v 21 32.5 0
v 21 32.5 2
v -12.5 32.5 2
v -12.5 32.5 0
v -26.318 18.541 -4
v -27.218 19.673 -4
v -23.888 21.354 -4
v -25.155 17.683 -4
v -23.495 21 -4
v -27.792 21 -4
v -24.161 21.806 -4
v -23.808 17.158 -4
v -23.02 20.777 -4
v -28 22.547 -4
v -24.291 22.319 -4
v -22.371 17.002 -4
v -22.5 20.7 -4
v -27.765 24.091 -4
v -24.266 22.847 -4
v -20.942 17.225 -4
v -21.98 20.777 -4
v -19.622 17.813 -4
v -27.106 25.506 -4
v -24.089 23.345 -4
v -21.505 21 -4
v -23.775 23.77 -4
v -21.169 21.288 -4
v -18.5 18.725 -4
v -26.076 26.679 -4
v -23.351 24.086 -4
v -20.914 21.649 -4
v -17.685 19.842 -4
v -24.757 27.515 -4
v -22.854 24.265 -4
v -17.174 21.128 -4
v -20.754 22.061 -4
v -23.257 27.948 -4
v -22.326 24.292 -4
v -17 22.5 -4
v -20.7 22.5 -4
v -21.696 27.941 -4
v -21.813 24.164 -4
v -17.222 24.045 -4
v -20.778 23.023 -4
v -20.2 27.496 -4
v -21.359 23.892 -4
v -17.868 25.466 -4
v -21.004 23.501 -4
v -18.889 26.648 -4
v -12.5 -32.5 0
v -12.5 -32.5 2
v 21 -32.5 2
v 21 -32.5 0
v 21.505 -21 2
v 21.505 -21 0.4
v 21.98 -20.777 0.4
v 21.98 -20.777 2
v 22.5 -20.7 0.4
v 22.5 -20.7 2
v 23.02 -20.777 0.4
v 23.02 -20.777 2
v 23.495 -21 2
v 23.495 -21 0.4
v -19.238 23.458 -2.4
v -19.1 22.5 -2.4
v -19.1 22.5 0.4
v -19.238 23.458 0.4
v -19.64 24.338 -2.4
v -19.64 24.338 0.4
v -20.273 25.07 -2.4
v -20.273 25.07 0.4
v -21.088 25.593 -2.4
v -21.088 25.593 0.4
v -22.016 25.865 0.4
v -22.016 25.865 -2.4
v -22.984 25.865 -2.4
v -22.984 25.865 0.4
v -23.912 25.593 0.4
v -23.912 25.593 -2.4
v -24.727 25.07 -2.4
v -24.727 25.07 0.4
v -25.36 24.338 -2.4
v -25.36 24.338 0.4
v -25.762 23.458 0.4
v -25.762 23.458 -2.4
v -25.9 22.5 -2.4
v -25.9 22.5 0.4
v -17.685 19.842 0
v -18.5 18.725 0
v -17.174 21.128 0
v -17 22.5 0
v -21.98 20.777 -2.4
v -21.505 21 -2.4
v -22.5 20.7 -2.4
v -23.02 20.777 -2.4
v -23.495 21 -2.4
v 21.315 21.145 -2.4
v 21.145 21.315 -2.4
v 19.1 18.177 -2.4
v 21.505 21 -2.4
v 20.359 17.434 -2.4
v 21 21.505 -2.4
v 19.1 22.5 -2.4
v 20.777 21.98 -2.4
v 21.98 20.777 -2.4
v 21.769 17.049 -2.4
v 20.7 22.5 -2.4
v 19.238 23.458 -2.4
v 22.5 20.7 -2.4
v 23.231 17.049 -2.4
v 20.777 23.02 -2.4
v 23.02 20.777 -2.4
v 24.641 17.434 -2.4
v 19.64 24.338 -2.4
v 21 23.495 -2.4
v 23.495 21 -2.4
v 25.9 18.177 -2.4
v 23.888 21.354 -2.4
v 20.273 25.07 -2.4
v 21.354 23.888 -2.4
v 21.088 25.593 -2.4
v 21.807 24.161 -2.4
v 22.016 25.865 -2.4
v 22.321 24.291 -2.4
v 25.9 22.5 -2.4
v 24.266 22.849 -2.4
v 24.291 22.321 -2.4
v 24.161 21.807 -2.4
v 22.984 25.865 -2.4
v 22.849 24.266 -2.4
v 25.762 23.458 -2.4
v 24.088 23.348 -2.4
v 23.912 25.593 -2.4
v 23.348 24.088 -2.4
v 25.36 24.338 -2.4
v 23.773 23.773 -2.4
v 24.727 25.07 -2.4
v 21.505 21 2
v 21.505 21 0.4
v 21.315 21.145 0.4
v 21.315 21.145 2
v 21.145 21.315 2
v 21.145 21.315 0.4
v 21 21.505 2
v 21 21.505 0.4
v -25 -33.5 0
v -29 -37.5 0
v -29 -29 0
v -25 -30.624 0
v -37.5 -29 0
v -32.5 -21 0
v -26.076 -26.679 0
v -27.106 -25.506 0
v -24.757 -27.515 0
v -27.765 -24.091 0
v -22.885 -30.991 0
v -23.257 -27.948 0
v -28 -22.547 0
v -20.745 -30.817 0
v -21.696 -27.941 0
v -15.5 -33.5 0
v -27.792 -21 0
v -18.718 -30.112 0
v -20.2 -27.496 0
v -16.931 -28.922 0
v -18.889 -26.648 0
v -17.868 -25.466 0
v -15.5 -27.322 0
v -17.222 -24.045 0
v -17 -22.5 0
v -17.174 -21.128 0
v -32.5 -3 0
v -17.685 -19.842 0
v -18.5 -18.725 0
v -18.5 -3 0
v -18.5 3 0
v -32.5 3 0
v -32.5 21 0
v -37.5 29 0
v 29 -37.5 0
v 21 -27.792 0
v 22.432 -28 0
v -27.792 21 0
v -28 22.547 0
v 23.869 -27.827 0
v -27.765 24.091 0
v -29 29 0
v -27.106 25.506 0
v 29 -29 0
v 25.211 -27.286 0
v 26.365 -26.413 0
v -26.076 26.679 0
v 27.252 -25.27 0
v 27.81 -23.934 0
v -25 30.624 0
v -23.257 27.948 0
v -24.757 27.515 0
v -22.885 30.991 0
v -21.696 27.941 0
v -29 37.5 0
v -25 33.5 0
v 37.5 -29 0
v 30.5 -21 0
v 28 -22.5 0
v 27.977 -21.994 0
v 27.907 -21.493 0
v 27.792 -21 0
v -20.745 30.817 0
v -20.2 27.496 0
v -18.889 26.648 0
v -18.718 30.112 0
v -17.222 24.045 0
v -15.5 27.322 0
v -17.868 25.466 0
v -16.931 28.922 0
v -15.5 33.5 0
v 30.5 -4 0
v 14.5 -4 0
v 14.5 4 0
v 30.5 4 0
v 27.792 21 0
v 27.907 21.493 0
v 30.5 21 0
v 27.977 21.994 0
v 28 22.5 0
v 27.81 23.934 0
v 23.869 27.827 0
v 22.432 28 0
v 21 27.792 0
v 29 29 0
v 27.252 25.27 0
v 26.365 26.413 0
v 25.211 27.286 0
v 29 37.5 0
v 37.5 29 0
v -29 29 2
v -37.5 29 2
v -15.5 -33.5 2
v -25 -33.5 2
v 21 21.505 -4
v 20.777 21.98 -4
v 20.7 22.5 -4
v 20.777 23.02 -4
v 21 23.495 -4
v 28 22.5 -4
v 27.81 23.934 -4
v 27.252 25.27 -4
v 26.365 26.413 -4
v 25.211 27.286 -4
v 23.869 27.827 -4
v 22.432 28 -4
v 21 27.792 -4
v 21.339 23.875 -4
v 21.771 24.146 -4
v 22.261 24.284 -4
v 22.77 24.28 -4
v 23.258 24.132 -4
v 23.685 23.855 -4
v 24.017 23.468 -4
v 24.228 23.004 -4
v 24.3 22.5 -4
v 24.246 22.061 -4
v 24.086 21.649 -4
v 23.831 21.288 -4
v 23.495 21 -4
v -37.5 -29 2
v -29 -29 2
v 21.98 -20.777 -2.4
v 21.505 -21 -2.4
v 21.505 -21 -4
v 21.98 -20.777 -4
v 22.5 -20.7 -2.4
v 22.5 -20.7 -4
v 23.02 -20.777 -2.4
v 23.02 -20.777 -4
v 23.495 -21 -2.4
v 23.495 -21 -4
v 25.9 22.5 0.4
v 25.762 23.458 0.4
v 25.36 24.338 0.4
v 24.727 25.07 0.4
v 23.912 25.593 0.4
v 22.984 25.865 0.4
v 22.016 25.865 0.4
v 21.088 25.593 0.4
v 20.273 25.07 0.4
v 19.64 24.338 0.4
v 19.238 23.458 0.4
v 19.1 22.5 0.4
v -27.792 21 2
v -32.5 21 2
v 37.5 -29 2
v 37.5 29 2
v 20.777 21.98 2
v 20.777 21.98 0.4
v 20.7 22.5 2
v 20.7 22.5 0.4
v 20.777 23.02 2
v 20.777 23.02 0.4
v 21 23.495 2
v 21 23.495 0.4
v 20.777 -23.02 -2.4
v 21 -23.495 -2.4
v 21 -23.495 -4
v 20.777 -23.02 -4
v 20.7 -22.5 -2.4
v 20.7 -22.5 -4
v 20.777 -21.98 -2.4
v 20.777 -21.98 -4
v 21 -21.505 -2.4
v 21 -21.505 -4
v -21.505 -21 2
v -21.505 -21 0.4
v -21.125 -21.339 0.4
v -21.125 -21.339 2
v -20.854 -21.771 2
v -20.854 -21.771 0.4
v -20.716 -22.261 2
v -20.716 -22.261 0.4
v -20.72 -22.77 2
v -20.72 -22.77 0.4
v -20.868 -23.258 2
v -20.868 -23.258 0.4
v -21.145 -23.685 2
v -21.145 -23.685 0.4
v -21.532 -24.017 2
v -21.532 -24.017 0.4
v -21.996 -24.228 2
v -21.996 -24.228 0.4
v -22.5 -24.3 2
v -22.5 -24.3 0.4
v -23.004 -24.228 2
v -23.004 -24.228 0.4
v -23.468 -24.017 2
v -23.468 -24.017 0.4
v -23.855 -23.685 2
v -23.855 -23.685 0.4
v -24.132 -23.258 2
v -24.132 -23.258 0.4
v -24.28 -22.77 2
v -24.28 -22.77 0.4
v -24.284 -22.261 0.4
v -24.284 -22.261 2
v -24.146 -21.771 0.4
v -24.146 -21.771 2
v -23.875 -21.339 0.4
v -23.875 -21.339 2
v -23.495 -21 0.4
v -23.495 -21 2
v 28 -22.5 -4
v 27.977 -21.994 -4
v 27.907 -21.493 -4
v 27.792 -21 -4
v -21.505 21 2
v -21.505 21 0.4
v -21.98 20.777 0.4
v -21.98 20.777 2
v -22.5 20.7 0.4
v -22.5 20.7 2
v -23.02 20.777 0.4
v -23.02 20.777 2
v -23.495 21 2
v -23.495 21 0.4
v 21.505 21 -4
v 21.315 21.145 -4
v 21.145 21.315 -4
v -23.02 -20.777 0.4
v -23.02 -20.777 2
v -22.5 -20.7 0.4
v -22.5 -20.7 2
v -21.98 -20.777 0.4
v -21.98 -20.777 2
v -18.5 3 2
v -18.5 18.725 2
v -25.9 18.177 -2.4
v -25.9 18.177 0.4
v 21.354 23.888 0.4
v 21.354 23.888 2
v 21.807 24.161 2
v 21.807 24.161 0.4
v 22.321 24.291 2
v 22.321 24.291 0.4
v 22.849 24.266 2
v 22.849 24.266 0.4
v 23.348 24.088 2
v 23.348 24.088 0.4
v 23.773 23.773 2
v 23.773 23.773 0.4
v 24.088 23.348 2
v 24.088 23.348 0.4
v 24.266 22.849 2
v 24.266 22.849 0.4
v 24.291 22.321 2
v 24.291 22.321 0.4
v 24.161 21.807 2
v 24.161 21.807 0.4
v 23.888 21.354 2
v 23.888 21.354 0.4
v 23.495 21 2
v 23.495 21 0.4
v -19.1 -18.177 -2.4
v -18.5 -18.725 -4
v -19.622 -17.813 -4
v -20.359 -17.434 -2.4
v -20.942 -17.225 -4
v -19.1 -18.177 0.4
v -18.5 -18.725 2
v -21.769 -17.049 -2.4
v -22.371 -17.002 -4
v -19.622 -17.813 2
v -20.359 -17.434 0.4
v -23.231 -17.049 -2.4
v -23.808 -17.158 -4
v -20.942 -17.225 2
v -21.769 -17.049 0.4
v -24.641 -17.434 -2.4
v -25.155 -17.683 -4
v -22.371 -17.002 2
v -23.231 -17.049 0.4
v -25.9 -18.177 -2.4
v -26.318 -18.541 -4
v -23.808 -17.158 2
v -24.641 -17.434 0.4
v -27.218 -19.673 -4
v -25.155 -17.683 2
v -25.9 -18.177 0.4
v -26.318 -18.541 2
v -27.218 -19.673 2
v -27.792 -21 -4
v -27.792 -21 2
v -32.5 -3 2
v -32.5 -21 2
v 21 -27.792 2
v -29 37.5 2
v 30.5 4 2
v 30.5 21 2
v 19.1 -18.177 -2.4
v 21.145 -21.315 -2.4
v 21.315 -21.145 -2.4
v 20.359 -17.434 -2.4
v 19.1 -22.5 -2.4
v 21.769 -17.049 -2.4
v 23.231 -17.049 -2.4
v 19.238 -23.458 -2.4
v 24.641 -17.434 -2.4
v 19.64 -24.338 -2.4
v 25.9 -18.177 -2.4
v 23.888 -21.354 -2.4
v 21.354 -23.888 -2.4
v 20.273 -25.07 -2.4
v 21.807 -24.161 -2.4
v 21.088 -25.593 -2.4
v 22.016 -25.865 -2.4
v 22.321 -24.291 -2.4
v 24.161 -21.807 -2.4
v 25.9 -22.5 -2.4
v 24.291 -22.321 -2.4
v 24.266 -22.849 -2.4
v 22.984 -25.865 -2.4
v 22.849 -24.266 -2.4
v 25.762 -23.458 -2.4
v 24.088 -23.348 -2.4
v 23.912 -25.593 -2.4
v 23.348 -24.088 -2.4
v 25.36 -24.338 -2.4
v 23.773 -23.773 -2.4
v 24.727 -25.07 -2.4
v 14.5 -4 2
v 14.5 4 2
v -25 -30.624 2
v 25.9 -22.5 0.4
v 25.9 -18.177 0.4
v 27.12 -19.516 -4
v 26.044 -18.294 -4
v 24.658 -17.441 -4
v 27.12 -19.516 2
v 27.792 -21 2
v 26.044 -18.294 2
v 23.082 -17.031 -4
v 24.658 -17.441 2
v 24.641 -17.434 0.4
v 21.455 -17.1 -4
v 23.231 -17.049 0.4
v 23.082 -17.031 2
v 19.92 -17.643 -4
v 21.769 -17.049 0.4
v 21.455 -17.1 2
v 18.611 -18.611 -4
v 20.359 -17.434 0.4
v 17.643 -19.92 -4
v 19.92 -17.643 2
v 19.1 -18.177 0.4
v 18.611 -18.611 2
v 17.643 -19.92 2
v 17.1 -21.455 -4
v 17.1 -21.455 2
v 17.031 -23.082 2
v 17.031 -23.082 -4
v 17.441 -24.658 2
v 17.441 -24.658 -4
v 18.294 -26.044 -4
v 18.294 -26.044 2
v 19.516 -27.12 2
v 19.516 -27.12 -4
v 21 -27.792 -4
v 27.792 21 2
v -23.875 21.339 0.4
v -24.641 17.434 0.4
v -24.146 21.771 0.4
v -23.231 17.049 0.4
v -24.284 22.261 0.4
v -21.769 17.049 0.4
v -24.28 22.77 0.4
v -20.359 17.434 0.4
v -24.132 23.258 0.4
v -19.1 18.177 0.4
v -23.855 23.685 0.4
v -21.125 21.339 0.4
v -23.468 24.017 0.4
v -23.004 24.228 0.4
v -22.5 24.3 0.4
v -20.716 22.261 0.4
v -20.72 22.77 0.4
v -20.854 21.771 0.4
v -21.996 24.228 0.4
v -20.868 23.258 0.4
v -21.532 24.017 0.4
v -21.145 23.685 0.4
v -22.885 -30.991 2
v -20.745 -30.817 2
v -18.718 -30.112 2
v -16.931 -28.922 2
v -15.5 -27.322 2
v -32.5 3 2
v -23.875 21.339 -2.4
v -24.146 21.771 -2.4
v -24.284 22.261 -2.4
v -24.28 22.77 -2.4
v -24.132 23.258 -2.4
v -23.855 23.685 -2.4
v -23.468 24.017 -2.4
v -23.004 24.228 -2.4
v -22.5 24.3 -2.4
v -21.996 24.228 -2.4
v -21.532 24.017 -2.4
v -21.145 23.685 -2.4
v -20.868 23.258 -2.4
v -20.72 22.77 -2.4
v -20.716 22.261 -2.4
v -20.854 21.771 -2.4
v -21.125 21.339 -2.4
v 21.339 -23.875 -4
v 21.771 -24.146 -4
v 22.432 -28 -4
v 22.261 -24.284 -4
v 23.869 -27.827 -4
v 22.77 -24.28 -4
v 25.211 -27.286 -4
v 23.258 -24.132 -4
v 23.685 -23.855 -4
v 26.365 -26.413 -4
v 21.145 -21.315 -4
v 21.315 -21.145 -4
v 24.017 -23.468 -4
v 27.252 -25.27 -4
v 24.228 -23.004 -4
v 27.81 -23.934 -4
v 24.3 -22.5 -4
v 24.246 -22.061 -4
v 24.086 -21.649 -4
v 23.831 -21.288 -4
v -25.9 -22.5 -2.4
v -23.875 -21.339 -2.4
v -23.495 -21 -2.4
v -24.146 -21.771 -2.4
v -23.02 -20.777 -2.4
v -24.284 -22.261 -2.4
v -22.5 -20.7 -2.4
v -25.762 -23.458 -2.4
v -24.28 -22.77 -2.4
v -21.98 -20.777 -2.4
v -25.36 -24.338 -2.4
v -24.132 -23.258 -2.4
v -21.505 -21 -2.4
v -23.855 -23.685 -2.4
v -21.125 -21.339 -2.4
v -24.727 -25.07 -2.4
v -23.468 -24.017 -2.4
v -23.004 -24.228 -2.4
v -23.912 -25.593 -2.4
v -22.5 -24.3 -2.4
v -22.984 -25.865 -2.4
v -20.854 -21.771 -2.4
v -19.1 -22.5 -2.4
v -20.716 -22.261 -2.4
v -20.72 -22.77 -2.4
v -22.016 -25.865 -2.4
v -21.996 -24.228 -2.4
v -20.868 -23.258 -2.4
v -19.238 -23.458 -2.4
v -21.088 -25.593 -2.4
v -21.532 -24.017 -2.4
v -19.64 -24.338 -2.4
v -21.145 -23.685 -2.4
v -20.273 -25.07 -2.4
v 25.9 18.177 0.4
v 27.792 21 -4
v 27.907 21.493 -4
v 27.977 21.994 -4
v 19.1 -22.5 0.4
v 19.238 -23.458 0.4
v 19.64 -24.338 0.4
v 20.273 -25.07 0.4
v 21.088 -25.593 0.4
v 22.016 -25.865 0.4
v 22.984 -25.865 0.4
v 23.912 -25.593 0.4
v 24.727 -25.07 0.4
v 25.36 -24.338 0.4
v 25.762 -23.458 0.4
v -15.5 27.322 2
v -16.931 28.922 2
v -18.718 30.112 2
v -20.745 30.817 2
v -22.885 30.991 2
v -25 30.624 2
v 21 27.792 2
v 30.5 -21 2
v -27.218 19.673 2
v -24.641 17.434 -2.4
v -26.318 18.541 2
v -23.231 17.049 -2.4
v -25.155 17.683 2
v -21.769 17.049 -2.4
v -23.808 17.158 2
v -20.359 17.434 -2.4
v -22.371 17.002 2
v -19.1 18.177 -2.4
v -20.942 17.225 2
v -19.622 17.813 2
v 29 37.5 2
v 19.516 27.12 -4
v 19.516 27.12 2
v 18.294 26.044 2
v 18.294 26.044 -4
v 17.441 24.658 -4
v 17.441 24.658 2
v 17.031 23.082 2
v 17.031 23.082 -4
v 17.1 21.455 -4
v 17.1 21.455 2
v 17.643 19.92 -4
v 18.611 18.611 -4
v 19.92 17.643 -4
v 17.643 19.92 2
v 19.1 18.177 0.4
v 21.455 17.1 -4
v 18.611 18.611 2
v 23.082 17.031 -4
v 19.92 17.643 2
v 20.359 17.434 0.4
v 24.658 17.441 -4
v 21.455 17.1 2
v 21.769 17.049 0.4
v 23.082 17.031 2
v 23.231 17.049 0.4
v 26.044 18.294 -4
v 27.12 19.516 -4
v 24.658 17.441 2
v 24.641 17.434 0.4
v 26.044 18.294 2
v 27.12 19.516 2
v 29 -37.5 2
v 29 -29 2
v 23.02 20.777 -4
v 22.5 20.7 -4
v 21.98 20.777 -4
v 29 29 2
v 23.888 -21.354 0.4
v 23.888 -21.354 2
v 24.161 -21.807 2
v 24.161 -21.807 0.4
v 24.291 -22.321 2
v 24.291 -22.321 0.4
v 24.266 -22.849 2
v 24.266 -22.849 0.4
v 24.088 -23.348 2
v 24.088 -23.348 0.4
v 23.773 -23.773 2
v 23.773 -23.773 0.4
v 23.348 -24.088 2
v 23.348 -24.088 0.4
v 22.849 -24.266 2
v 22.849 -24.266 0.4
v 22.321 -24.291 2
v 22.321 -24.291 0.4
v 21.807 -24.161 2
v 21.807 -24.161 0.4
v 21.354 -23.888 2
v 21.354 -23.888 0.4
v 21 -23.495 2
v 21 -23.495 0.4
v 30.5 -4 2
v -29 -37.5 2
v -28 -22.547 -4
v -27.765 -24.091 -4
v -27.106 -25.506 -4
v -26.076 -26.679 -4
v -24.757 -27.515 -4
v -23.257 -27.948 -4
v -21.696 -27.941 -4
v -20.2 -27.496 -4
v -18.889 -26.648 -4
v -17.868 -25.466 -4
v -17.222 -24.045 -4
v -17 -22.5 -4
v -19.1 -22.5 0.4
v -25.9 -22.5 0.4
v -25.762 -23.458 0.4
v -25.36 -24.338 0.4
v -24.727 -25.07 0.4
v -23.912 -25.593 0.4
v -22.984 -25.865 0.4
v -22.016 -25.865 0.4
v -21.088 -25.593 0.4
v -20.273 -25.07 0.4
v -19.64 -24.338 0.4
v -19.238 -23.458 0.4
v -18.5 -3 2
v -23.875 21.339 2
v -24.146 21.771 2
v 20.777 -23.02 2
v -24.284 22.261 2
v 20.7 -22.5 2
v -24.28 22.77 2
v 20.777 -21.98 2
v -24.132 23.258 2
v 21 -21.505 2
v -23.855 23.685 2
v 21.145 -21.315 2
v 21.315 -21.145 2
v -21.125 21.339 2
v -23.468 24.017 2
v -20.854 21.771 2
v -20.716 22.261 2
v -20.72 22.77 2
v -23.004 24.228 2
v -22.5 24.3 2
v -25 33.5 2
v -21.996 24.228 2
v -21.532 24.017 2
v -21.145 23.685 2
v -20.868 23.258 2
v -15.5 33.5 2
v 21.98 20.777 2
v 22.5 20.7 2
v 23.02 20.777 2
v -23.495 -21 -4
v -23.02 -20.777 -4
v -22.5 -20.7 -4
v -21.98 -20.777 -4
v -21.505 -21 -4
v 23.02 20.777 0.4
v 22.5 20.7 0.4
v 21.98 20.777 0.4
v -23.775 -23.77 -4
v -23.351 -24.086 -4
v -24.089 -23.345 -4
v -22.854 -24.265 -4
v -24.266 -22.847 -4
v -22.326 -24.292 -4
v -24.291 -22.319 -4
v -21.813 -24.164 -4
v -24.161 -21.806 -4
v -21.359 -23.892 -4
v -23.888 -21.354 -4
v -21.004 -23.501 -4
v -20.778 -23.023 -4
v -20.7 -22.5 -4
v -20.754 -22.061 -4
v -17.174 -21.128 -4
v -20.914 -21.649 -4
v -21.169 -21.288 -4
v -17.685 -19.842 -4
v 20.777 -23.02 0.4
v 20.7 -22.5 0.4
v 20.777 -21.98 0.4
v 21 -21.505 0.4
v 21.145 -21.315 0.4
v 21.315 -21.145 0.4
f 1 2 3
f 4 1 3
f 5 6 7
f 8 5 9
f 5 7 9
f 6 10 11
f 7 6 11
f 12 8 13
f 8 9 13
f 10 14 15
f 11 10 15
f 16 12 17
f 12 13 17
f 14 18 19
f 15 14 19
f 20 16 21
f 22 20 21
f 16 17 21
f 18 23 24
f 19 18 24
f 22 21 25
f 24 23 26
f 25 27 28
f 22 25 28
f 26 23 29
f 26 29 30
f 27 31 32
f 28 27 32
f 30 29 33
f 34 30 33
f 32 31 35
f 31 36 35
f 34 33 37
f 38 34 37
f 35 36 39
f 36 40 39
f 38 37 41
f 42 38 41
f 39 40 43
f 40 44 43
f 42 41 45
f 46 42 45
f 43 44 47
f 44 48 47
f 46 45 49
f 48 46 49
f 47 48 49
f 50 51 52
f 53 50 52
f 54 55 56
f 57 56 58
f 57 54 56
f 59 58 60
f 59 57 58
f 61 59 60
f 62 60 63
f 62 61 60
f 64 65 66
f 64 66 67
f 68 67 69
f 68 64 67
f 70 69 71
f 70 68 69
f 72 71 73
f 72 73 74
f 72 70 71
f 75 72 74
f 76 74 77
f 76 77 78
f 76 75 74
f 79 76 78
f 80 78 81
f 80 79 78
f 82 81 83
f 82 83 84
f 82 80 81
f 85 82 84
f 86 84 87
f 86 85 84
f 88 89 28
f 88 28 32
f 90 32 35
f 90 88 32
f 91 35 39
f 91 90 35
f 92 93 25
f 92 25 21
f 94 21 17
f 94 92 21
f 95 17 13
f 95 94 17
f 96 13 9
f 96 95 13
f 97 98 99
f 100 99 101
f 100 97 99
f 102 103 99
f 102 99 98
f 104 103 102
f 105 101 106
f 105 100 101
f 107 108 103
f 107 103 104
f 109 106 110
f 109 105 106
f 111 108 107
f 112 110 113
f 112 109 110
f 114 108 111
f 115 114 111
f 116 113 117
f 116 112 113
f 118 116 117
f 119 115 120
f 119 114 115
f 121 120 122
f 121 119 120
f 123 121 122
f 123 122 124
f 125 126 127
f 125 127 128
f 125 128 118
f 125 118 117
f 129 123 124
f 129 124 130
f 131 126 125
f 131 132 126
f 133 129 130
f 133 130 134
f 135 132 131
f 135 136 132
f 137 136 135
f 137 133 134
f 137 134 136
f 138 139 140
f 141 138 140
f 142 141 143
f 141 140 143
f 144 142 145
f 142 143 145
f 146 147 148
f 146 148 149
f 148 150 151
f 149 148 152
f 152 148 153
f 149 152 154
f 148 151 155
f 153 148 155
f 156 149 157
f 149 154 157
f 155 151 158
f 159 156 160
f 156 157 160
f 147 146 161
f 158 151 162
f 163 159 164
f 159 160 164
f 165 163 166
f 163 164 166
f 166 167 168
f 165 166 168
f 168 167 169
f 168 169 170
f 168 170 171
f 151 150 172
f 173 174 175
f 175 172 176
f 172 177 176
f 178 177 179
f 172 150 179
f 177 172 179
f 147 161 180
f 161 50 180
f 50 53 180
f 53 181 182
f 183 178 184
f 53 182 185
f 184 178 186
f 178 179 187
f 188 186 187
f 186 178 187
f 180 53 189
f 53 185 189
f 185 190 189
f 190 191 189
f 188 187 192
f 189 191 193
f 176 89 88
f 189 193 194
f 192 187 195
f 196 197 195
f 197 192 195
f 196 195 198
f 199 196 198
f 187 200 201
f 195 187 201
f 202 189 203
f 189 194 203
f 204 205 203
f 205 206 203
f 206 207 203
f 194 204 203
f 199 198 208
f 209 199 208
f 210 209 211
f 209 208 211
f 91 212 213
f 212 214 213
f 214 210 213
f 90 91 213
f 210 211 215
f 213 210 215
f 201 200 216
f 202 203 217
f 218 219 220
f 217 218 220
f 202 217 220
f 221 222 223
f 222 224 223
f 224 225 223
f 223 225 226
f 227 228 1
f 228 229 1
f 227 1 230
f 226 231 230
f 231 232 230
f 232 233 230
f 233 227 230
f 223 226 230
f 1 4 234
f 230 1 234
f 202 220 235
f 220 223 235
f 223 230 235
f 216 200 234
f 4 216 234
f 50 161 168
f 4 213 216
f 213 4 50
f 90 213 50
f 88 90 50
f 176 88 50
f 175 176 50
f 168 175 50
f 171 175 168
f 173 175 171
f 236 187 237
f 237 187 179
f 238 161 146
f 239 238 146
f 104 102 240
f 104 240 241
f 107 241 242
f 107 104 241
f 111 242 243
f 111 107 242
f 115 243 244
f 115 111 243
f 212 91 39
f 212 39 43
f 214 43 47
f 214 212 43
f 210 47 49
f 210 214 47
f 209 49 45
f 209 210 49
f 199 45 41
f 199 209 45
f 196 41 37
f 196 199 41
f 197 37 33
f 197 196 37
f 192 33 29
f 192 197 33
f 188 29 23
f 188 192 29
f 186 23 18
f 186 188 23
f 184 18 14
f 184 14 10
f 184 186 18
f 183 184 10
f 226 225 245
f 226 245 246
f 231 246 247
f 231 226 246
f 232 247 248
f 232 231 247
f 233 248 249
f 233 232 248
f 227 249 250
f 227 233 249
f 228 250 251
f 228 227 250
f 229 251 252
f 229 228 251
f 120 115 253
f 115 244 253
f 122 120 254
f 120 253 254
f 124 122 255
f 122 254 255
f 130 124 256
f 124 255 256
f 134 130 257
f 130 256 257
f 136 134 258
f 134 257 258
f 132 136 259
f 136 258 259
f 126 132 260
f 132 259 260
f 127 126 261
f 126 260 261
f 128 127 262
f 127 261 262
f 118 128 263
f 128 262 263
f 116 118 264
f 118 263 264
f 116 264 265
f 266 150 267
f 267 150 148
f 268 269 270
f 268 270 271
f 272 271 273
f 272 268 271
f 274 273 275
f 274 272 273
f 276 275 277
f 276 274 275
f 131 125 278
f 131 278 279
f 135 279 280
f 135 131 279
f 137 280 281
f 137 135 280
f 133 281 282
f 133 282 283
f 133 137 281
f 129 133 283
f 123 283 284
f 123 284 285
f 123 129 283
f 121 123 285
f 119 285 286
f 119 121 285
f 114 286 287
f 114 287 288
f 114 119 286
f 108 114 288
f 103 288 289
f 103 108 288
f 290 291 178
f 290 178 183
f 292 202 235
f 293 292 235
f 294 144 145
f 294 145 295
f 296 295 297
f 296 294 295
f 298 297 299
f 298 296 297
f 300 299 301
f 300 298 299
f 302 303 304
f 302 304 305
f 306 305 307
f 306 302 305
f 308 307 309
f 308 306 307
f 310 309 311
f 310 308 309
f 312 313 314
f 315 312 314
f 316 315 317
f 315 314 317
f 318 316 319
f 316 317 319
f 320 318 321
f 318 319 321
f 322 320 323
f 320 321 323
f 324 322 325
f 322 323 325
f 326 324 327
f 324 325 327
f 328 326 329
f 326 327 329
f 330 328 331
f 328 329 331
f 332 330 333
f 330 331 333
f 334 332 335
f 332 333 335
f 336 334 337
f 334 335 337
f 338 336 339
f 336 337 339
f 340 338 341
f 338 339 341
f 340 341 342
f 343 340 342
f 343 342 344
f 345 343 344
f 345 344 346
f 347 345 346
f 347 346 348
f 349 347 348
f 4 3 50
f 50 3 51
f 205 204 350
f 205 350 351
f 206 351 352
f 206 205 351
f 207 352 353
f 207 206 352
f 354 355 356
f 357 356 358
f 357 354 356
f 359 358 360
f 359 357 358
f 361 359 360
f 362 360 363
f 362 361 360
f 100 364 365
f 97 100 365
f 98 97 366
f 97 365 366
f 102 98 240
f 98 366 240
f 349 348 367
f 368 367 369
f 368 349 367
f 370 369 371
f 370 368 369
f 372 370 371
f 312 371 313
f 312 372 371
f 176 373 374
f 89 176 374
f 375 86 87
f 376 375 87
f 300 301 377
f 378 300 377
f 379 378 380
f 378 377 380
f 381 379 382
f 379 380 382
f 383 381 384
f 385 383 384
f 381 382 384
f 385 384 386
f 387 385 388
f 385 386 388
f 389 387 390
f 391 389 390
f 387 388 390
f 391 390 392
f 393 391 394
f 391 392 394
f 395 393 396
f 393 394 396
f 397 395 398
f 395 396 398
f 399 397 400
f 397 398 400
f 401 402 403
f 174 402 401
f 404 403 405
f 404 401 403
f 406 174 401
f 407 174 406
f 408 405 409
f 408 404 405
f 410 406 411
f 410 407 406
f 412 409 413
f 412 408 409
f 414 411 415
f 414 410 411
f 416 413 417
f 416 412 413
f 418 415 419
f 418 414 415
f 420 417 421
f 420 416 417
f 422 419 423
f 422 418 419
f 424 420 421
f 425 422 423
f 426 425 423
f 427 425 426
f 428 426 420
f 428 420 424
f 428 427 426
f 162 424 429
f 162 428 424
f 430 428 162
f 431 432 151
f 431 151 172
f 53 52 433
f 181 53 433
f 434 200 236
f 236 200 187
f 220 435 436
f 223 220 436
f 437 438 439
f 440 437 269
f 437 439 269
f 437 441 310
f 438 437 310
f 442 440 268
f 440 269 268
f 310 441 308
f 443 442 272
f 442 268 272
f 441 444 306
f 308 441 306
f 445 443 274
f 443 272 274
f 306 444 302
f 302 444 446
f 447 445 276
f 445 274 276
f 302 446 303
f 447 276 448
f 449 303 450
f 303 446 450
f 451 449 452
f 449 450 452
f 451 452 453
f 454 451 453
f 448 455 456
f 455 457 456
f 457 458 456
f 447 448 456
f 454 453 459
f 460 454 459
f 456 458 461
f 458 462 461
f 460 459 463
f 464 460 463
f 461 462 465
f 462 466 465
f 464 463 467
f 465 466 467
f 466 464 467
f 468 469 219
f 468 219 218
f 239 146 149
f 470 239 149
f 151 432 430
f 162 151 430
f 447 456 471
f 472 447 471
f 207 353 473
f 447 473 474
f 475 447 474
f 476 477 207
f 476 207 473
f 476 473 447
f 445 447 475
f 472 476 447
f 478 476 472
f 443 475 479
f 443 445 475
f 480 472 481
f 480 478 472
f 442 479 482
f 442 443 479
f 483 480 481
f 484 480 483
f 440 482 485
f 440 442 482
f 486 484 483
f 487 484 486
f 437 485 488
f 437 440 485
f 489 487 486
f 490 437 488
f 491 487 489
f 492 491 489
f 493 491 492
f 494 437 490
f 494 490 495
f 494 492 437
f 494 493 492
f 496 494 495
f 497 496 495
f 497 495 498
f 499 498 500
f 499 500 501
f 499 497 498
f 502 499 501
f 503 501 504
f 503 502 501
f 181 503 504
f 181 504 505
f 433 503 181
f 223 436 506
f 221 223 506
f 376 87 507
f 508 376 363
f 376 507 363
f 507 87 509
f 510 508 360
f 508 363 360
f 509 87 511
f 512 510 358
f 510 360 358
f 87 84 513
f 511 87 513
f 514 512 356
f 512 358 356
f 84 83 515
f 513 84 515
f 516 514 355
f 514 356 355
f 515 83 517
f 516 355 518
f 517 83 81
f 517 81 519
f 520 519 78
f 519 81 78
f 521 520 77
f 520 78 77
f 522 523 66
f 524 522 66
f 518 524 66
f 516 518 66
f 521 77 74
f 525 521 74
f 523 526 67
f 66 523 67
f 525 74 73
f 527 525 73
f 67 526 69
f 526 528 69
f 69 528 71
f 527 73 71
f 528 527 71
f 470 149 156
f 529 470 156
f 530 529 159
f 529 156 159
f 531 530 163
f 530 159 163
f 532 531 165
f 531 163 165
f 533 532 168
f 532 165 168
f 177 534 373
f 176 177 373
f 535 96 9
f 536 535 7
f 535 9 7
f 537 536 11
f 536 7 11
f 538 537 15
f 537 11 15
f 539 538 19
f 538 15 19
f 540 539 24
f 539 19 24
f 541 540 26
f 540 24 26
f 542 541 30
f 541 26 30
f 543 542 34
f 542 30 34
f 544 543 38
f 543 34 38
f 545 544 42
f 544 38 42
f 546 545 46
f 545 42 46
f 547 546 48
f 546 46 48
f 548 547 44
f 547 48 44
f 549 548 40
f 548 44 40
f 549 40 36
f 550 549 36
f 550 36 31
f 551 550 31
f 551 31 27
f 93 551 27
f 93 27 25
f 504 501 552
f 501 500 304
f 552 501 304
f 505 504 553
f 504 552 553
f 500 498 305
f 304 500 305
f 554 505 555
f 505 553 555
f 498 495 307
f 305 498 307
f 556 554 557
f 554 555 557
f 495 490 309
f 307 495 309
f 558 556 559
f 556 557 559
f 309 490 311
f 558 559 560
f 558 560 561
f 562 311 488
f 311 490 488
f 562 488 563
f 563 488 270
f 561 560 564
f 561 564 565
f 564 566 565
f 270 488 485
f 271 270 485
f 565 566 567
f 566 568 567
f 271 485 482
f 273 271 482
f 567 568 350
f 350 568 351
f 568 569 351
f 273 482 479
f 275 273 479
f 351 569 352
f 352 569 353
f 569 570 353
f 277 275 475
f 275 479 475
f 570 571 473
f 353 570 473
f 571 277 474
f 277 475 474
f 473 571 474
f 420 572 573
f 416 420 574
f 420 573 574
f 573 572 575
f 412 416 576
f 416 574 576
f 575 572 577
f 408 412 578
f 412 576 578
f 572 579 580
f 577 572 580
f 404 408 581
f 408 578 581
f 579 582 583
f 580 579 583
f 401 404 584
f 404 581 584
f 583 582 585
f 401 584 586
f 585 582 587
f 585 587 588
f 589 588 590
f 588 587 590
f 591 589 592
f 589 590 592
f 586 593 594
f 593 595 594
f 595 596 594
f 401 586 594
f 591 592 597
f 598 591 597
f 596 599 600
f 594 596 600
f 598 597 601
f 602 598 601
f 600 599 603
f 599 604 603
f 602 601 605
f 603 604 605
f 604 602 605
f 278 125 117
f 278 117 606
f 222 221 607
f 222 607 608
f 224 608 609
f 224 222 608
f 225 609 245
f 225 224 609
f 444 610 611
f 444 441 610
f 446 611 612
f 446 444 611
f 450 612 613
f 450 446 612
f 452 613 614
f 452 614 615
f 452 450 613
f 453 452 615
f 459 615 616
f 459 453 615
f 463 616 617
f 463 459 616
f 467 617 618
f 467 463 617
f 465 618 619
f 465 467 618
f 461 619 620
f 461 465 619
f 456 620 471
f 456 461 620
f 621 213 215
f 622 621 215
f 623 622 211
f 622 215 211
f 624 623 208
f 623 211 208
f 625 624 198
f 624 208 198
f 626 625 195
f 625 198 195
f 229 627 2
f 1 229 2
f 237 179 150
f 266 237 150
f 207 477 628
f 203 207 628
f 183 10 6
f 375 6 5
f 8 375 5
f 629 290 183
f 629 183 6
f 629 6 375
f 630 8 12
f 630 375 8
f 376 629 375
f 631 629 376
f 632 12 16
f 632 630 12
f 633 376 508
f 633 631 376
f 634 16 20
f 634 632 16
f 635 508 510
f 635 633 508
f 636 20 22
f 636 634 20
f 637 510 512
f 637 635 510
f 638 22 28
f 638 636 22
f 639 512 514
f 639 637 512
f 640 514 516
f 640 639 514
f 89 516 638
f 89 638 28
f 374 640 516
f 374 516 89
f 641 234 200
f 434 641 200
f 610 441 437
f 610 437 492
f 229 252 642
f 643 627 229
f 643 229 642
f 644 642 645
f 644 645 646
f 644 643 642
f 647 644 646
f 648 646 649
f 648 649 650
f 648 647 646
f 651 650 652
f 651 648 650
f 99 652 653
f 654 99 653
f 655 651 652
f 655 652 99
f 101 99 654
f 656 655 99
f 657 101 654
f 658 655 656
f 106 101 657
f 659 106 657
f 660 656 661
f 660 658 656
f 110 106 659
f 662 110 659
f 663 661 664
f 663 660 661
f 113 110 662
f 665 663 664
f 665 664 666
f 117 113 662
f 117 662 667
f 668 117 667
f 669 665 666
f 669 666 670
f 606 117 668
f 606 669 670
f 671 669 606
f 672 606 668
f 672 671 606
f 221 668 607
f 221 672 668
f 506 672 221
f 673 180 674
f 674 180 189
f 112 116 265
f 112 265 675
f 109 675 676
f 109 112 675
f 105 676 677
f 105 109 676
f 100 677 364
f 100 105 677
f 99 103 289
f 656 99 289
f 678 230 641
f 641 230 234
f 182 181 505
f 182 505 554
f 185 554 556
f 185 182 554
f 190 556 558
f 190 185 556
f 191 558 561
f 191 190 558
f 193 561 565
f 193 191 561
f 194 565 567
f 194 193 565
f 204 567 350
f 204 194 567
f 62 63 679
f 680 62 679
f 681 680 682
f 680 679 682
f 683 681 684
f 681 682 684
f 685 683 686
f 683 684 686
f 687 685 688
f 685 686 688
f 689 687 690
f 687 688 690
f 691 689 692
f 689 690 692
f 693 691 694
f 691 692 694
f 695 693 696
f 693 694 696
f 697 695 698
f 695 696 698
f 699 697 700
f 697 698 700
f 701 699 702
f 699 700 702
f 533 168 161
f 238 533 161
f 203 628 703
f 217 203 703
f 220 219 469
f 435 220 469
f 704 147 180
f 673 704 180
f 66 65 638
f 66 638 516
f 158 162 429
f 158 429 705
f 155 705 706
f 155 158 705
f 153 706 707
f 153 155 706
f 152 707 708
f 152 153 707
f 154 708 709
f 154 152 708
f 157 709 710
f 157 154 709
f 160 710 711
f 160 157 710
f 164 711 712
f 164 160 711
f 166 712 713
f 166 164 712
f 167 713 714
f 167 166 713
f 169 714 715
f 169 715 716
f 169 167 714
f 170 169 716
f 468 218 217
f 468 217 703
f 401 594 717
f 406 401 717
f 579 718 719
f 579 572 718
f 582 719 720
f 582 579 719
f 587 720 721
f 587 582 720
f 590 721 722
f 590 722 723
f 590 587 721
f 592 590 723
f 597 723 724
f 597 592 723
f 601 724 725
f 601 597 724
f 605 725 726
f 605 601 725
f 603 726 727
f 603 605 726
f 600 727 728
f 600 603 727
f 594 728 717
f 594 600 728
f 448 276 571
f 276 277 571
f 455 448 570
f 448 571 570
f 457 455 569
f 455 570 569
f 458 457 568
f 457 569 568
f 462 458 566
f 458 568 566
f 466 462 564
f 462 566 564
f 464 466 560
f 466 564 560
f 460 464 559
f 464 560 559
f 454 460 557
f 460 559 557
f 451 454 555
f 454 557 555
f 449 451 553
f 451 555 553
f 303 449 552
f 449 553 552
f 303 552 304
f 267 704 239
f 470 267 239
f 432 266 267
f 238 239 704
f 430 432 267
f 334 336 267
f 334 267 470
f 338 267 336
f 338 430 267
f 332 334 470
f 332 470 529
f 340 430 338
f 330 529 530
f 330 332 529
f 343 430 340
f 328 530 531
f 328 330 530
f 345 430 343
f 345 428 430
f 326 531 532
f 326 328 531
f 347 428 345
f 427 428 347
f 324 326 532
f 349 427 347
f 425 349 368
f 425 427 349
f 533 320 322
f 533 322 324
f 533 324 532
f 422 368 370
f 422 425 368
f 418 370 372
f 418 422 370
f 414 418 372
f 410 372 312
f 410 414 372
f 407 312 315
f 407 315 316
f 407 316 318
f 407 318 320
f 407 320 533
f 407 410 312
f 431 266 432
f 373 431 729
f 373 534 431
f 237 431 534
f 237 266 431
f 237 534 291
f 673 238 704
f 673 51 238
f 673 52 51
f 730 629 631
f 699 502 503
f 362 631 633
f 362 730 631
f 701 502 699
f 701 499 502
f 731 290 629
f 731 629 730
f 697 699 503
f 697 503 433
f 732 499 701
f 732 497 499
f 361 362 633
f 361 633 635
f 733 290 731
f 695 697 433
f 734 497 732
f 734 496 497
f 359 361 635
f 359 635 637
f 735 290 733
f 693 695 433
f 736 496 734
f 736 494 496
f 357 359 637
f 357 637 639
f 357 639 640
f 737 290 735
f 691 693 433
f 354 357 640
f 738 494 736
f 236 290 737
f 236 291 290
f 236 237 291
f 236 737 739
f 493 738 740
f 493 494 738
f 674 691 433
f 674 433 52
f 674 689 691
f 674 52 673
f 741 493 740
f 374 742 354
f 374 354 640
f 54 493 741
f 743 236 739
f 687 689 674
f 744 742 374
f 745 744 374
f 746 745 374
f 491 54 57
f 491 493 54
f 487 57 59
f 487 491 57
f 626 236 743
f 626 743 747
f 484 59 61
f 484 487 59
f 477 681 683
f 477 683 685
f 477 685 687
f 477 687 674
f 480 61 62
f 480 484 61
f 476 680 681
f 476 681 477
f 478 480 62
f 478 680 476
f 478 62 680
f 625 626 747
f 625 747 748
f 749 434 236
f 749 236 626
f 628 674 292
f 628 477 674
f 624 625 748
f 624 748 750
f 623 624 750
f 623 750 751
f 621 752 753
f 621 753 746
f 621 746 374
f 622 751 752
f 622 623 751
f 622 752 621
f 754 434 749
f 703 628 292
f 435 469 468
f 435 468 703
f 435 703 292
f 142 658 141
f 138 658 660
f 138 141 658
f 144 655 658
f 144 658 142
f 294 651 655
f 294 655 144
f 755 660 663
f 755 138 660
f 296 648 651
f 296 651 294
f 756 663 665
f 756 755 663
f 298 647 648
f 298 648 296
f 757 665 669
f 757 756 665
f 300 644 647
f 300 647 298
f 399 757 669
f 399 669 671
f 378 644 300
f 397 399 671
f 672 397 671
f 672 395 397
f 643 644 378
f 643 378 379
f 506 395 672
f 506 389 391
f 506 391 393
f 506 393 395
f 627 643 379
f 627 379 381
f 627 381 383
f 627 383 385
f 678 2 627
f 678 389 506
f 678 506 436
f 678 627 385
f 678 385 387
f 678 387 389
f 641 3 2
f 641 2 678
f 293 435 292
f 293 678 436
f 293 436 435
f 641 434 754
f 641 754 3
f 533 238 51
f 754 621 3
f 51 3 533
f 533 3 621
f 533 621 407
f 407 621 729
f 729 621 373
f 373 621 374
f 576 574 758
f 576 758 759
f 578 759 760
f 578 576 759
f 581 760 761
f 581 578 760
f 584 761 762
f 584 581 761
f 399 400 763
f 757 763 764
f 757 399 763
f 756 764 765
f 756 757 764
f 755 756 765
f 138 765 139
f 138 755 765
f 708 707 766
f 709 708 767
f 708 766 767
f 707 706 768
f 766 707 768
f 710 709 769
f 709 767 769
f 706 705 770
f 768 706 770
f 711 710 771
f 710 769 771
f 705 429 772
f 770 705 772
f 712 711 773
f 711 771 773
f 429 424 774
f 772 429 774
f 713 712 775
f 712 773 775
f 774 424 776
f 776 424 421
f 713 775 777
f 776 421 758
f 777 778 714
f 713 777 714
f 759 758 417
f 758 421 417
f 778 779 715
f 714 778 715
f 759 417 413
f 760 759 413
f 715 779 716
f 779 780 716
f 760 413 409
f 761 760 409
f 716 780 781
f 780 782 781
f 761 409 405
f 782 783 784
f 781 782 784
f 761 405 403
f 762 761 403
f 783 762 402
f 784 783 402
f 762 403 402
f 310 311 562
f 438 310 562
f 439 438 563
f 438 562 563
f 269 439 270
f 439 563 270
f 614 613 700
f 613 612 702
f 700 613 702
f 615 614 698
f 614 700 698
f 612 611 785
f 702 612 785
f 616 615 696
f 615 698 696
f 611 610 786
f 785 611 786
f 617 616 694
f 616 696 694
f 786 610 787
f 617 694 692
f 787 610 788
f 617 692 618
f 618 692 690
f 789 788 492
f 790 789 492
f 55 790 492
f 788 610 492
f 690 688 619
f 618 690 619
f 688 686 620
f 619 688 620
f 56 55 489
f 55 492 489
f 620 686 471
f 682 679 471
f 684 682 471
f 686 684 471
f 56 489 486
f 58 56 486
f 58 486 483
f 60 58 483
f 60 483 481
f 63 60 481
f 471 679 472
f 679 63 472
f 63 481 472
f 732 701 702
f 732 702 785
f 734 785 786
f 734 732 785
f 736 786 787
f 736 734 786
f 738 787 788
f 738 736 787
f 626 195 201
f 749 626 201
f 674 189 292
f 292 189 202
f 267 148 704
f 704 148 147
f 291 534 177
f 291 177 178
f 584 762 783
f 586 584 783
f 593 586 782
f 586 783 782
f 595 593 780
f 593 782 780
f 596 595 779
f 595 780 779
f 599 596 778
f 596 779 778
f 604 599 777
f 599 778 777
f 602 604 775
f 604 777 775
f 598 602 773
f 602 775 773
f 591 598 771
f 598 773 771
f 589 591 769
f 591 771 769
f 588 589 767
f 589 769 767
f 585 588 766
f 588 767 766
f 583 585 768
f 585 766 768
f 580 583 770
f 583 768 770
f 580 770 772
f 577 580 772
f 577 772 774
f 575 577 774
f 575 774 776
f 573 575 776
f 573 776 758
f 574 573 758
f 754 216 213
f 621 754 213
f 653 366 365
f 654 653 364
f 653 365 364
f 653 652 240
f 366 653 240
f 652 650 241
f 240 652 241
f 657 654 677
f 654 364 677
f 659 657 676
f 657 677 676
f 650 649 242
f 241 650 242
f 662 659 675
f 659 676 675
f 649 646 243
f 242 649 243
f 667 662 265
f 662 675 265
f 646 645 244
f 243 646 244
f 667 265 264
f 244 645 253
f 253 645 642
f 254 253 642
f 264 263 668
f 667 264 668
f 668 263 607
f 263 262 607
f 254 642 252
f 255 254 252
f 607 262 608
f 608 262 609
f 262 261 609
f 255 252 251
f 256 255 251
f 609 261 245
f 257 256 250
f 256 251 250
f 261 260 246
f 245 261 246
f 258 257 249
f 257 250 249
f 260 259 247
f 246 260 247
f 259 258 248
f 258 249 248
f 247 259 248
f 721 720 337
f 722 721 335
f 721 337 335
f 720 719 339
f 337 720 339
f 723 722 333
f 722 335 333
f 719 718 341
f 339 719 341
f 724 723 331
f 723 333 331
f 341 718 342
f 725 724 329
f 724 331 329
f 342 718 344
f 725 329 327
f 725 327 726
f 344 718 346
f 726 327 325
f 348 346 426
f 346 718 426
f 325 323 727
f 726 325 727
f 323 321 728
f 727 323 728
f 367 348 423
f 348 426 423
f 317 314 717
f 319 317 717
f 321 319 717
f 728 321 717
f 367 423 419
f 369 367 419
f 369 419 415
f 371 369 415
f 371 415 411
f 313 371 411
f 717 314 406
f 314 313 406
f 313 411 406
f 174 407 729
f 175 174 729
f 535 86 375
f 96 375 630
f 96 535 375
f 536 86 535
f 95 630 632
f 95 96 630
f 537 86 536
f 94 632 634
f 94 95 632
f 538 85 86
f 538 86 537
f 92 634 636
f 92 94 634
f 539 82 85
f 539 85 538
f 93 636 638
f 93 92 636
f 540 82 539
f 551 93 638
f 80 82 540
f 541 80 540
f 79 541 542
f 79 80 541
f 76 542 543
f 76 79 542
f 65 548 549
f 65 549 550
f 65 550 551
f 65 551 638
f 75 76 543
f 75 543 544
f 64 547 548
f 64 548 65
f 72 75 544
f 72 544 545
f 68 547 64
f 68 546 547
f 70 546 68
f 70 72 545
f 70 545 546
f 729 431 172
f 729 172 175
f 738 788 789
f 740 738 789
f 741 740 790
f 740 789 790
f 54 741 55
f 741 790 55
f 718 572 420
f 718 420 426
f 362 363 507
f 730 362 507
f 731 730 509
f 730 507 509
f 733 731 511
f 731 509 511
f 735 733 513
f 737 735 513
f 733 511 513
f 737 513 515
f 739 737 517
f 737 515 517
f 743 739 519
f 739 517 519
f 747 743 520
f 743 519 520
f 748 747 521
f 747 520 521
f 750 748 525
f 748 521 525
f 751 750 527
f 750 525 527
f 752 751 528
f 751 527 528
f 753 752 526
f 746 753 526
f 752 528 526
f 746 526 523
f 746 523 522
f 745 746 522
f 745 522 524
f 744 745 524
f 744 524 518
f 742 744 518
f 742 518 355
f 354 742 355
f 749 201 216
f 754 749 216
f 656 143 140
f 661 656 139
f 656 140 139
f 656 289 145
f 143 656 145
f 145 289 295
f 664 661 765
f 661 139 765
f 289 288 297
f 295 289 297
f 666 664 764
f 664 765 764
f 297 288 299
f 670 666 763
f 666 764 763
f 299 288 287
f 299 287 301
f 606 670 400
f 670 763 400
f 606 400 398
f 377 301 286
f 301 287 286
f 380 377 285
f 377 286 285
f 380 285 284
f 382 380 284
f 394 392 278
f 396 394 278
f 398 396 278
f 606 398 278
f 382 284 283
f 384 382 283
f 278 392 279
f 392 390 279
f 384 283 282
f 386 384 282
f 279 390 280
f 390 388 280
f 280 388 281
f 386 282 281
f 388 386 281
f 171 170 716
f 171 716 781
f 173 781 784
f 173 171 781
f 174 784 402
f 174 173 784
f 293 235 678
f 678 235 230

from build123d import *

# Parameters (mm, degrees)
F2_DEPTH       = 2
F3_W           = 13.9999988079
F3_H           = 18
F4_DEPTH       = 2.001
F6_DEPTH       = 6
F7_R           = 1.8
F8_DEPTH       = 6.001
F10_R          = 3.4
F11_DEPTH      = 1.4
F11_DEPTH_BACK = 1.4
F13_W          = 6.8
F13_H          = 2.8
F14_DEPTH      = 8.8
F16_W          = 6.8
F16_H          = 2.8
F17_DEPTH      = 10.3
F18_W          = 8
F18_H          = 2
F19_DEPTH      = 16
F21_DEPTH      = 2.001


# Not quite as in the source:
# - after a boolean that leaves OpenCascade's solid faulty, fix() repairs it
# - a feature names something its author has since deleted; it is built from what else it names


with BuildPart() as f2:
    # F1 (on Top) → F2 (new body)
    with BuildSketch(Plane.XY):
        Polygon((29, 29), (29, 37.5), (-29, 37.5), (-29, 29), (-37.5, 29), (-37.5, -29), (-29, -29), (-29, -37.5), (29, -37.5), (29, -29), (37.5, -29), (37.5, 29), align=None)
    extrude(amount=F2_DEPTH)

    # F3 (on face) → F4 (cut, through all)
    with BuildSketch(Plane.XY.offset(2)):
        with Locations((-25.499999404, 12)):
            Rectangle(F3_W, F3_H)
        with Locations((-25.499999404, -12)):
            Rectangle(F3_W, F3_H)
        Polygon((-12.5, -32.5), (21, -32.5), (21, -21), (30.5, -21), (30.5, 21), (21, 21), (21, 32.5), (-12.5, 32.5), align=None)
    extrude(amount=-F4_DEPTH, mode=Mode.SUBTRACT)

    # F5 (on face) → F6 (join)
    with BuildSketch(Plane.XY.offset(2)):
        with BuildLine():
            ThreePointArc((-23.4949874371, 21), (-23.3511822993, 24.0860292221), (-20.7, 22.5))
            ThreePointArc((-20.7, 22.5), (-20.9139707779, 21.6488177007), (-21.5050125629, 21))
            Line((-21.5050125629, 21), (-18.5, 21))
            Line((-18.5, 21), (-18.5, 18.7250827824))
            ThreePointArc((-18.5, 18.7250827824), (-17.3887379249, 20.4689903988), (-17, 22.5))
            ThreePointArc((-17, 22.5), (-23.2572105316, 27.9476262914), (-27.7915026221, 21))
            Line((-27.7915026221, 21), (-23.4949874371, 21))
        make_face()
        with BuildLine():
            ThreePointArc((-21.5050125629, 21), (-22.5, 20.7), (-23.4949874371, 21))
            Line((-23.4949874371, 21), (-27.7915026221, 21))
            ThreePointArc((-27.7915026221, 21), (-23.8079781506, 17.1577913596), (-18.5, 18.7250827824))
            Line((-18.5, 18.7250827824), (-18.5, 21))
            Line((-18.5, 21), (-21.5050125629, 21))
        make_face()
        with BuildLine():
            ThreePointArc((-21.5050125629, -21), (-20.9139707779, -21.6488177007), (-20.7, -22.5))
            ThreePointArc((-20.7, -22.5), (-23.3511822993, -24.0860292221), (-23.4949874371, -21))
            Line((-23.4949874371, -21), (-27.7915026221, -21))
            ThreePointArc((-27.7915026221, -21), (-23.2572105316, -27.9476262914), (-17, -22.5))
            ThreePointArc((-17, -22.5), (-17.3887379249, -20.4689903988), (-18.5, -18.7250827824))
            Line((-18.5, -18.7250827824), (-18.5, -21))
            Line((-18.5, -21), (-21.5050125629, -21))
        make_face()
        with BuildLine():
            ThreePointArc((-23.4949874371, -21), (-22.5, -20.7), (-21.5050125629, -21))
            Line((-21.5050125629, -21), (-18.5, -21))
            Line((-18.5, -21), (-18.5, -18.7250827824))
            ThreePointArc((-18.5, -18.7250827824), (-23.8079781506, -17.1577913596), (-27.7915026221, -21))
            Line((-27.7915026221, -21), (-23.4949874371, -21))
        make_face()
        with BuildLine():
            ThreePointArc((21, 23.4949874371), (23.0196152423, 24.223368794), (24.3, 22.5))
            ThreePointArc((24.3, 22.5), (24.0860292221, 21.6488177007), (23.4949874371, 21))
            Line((23.4949874371, 21), (27.7915026221, 21))
            ThreePointArc((27.7915026221, 21), (27.9476262914, 21.7427894684), (28, 22.5))
            ThreePointArc((28, 22.5), (25.8166247904, 26.8874821937), (21, 27.7915026221))
            Line((21, 27.7915026221), (21, 23.4949874371))
        make_face()
        with BuildLine():
            ThreePointArc((21, 21.5050125629), (20.7, 22.5), (21, 23.4949874371))
            Line((21, 23.4949874371), (21, 27.7915026221))
            ThreePointArc((21, 27.7915026221), (18.6109127035, 18.6109127035), (27.7915026221, 21))
            Line((27.7915026221, 21), (23.4949874371, 21))
            ThreePointArc((23.4949874371, 21), (22.5, 20.7), (21.5050125629, 21))
            Line((21.5050125629, 21), (21, 21))
            Line((21, 21), (21, 21.5050125629))
        make_face()
        with BuildLine():
            ThreePointArc((21.5050125629, 21), (21.2272077939, 21.2272077939), (21, 21.5050125629))
            Line((21, 21.5050125629), (21, 21))
            Line((21, 21), (21.5050125629, 21))
        make_face()
        with BuildLine():
            Line((23.4949874371, -21), (27.7915026221, -21))
            ThreePointArc((27.7915026221, -21), (18.6109127035, -18.6109127035), (21, -27.7915026221))
            Line((21, -27.7915026221), (21, -23.4949874371))
            ThreePointArc((21, -23.4949874371), (20.7, -22.5), (21, -21.5050125629))
            Line((21, -21.5050125629), (21, -21))
            Line((21, -21), (21.5050125629, -21))
            ThreePointArc((21.5050125629, -21), (22.5, -20.7), (23.4949874371, -21))
        make_face()
        with BuildLine():
            ThreePointArc((28, -22.5), (27.9476262914, -21.7427894684), (27.7915026221, -21))
            Line((27.7915026221, -21), (23.4949874371, -21))
            ThreePointArc((23.4949874371, -21), (24.0860292221, -21.6488177007), (24.3, -22.5))
            ThreePointArc((24.3, -22.5), (23.0196152423, -24.223368794), (21, -23.4949874371))
            Line((21, -23.4949874371), (21, -27.7915026221))
            ThreePointArc((21, -27.7915026221), (25.8166247904, -26.8874821937), (28, -22.5))
        make_face()
        with BuildLine():
            ThreePointArc((21, -21.5050125629), (21.2272077939, -21.2272077939), (21.5050125629, -21))
            Line((21.5050125629, -21), (21, -21))
            Line((21, -21), (21, -21.5050125629))
        make_face()
    extrude(amount=-F6_DEPTH)

    # F7 (on face) → F8 (cut, through all)
    with BuildSketch(Plane(origin=(0, 0, -4), x_dir=(1, 0, 0), z_dir=(0, 0, -1))):
        with Locations((-22.5, -22.5)):
            Circle(F7_R)
        with Locations((-22.5, 22.5)):
            Circle(F7_R)
        with Locations((22.5, -22.5)):
            Circle(F7_R)
        with Locations((22.5, 22.5)):
            Circle(F7_R)
    extrude(amount=-F8_DEPTH, mode=Mode.SUBTRACT)

    add(f2.part.fix(), mode=Mode.REPLACE)

    # F10 (on offset) → F11 (cut, two sides)
    with BuildSketch(Plane.XY.offset(-1)) as f11_sk:
        with Locations((22.5, -22.5)):
            Circle(F10_R)
        with Locations((22.5, 22.5)):
            Circle(F10_R)
        with Locations((-22.5, -22.5)):
            Circle(F10_R)
        with Locations((-22.5, 22.5)):
            Circle(F10_R)
    extrude(amount=-F11_DEPTH, mode=Mode.SUBTRACT)
    extrude(f11_sk.sketch, amount=F11_DEPTH_BACK, mode=Mode.SUBTRACT)

    # F13 (on offset) → F14 (cut)
    with BuildSketch(Plane.XZ.offset(22.5)):
        with Locations((22.5, -1)):
            Rectangle(F13_W, F13_H)
        with Locations((-22.5, -1)):
            Rectangle(F13_W, F13_H)
    extrude(amount=-F14_DEPTH, mode=Mode.SUBTRACT)

    # F16 (on offset) → F17 (cut)
    with BuildSketch(Plane.XZ.offset(-22.5)):
        with Locations((22.5, -1)):
            Rectangle(F16_W, F16_H)
        with Locations((-22.5, -1)):
            Rectangle(F16_W, F16_H)
    extrude(amount=F17_DEPTH, mode=Mode.SUBTRACT)

    # F18 (on face) → F19 (join)
    with BuildSketch(Plane(origin=(30.5, 0, 0), x_dir=(0, -1, 0), z_dir=(-1, 0, 0))):
        with Locations((0, 1)):
            Rectangle(F18_W, F18_H)
    extrude(amount=F19_DEPTH)

    # F20 (on face) → F21 (cut, through all)
    with BuildSketch(Plane(origin=(0, 0, 0), x_dir=(1, 0, 0), z_dir=(0, 0, -1))):
        with BuildLine():
            ThreePointArc((-25, 30.6240384046), (-19.7091840098, 30.5287823553), (-15.4999997467, 27.3218250127))
            Line((-15.4999997467, 27.3218250127), (-15.4999997467, 33.5))
            Line((-15.4999997467, 33.5), (-25, 33.5))
            Line((-25, 33.5), (-25, 30.6240384046))
        make_face()
        with BuildLine():
            Line((-25, -33.5), (-15.4999997467, -33.5))
            Line((-15.4999997467, -33.5), (-15.4999997467, -27.3218250127))
            ThreePointArc((-15.4999997467, -27.3218250127), (-19.7091840098, -30.5287823553), (-25, -30.6240384046))
            Line((-25, -30.6240384046), (-25, -33.5))
        make_face()
    extrude(amount=-F21_DEPTH, mode=Mode.SUBTRACT)


solid = f2.part
